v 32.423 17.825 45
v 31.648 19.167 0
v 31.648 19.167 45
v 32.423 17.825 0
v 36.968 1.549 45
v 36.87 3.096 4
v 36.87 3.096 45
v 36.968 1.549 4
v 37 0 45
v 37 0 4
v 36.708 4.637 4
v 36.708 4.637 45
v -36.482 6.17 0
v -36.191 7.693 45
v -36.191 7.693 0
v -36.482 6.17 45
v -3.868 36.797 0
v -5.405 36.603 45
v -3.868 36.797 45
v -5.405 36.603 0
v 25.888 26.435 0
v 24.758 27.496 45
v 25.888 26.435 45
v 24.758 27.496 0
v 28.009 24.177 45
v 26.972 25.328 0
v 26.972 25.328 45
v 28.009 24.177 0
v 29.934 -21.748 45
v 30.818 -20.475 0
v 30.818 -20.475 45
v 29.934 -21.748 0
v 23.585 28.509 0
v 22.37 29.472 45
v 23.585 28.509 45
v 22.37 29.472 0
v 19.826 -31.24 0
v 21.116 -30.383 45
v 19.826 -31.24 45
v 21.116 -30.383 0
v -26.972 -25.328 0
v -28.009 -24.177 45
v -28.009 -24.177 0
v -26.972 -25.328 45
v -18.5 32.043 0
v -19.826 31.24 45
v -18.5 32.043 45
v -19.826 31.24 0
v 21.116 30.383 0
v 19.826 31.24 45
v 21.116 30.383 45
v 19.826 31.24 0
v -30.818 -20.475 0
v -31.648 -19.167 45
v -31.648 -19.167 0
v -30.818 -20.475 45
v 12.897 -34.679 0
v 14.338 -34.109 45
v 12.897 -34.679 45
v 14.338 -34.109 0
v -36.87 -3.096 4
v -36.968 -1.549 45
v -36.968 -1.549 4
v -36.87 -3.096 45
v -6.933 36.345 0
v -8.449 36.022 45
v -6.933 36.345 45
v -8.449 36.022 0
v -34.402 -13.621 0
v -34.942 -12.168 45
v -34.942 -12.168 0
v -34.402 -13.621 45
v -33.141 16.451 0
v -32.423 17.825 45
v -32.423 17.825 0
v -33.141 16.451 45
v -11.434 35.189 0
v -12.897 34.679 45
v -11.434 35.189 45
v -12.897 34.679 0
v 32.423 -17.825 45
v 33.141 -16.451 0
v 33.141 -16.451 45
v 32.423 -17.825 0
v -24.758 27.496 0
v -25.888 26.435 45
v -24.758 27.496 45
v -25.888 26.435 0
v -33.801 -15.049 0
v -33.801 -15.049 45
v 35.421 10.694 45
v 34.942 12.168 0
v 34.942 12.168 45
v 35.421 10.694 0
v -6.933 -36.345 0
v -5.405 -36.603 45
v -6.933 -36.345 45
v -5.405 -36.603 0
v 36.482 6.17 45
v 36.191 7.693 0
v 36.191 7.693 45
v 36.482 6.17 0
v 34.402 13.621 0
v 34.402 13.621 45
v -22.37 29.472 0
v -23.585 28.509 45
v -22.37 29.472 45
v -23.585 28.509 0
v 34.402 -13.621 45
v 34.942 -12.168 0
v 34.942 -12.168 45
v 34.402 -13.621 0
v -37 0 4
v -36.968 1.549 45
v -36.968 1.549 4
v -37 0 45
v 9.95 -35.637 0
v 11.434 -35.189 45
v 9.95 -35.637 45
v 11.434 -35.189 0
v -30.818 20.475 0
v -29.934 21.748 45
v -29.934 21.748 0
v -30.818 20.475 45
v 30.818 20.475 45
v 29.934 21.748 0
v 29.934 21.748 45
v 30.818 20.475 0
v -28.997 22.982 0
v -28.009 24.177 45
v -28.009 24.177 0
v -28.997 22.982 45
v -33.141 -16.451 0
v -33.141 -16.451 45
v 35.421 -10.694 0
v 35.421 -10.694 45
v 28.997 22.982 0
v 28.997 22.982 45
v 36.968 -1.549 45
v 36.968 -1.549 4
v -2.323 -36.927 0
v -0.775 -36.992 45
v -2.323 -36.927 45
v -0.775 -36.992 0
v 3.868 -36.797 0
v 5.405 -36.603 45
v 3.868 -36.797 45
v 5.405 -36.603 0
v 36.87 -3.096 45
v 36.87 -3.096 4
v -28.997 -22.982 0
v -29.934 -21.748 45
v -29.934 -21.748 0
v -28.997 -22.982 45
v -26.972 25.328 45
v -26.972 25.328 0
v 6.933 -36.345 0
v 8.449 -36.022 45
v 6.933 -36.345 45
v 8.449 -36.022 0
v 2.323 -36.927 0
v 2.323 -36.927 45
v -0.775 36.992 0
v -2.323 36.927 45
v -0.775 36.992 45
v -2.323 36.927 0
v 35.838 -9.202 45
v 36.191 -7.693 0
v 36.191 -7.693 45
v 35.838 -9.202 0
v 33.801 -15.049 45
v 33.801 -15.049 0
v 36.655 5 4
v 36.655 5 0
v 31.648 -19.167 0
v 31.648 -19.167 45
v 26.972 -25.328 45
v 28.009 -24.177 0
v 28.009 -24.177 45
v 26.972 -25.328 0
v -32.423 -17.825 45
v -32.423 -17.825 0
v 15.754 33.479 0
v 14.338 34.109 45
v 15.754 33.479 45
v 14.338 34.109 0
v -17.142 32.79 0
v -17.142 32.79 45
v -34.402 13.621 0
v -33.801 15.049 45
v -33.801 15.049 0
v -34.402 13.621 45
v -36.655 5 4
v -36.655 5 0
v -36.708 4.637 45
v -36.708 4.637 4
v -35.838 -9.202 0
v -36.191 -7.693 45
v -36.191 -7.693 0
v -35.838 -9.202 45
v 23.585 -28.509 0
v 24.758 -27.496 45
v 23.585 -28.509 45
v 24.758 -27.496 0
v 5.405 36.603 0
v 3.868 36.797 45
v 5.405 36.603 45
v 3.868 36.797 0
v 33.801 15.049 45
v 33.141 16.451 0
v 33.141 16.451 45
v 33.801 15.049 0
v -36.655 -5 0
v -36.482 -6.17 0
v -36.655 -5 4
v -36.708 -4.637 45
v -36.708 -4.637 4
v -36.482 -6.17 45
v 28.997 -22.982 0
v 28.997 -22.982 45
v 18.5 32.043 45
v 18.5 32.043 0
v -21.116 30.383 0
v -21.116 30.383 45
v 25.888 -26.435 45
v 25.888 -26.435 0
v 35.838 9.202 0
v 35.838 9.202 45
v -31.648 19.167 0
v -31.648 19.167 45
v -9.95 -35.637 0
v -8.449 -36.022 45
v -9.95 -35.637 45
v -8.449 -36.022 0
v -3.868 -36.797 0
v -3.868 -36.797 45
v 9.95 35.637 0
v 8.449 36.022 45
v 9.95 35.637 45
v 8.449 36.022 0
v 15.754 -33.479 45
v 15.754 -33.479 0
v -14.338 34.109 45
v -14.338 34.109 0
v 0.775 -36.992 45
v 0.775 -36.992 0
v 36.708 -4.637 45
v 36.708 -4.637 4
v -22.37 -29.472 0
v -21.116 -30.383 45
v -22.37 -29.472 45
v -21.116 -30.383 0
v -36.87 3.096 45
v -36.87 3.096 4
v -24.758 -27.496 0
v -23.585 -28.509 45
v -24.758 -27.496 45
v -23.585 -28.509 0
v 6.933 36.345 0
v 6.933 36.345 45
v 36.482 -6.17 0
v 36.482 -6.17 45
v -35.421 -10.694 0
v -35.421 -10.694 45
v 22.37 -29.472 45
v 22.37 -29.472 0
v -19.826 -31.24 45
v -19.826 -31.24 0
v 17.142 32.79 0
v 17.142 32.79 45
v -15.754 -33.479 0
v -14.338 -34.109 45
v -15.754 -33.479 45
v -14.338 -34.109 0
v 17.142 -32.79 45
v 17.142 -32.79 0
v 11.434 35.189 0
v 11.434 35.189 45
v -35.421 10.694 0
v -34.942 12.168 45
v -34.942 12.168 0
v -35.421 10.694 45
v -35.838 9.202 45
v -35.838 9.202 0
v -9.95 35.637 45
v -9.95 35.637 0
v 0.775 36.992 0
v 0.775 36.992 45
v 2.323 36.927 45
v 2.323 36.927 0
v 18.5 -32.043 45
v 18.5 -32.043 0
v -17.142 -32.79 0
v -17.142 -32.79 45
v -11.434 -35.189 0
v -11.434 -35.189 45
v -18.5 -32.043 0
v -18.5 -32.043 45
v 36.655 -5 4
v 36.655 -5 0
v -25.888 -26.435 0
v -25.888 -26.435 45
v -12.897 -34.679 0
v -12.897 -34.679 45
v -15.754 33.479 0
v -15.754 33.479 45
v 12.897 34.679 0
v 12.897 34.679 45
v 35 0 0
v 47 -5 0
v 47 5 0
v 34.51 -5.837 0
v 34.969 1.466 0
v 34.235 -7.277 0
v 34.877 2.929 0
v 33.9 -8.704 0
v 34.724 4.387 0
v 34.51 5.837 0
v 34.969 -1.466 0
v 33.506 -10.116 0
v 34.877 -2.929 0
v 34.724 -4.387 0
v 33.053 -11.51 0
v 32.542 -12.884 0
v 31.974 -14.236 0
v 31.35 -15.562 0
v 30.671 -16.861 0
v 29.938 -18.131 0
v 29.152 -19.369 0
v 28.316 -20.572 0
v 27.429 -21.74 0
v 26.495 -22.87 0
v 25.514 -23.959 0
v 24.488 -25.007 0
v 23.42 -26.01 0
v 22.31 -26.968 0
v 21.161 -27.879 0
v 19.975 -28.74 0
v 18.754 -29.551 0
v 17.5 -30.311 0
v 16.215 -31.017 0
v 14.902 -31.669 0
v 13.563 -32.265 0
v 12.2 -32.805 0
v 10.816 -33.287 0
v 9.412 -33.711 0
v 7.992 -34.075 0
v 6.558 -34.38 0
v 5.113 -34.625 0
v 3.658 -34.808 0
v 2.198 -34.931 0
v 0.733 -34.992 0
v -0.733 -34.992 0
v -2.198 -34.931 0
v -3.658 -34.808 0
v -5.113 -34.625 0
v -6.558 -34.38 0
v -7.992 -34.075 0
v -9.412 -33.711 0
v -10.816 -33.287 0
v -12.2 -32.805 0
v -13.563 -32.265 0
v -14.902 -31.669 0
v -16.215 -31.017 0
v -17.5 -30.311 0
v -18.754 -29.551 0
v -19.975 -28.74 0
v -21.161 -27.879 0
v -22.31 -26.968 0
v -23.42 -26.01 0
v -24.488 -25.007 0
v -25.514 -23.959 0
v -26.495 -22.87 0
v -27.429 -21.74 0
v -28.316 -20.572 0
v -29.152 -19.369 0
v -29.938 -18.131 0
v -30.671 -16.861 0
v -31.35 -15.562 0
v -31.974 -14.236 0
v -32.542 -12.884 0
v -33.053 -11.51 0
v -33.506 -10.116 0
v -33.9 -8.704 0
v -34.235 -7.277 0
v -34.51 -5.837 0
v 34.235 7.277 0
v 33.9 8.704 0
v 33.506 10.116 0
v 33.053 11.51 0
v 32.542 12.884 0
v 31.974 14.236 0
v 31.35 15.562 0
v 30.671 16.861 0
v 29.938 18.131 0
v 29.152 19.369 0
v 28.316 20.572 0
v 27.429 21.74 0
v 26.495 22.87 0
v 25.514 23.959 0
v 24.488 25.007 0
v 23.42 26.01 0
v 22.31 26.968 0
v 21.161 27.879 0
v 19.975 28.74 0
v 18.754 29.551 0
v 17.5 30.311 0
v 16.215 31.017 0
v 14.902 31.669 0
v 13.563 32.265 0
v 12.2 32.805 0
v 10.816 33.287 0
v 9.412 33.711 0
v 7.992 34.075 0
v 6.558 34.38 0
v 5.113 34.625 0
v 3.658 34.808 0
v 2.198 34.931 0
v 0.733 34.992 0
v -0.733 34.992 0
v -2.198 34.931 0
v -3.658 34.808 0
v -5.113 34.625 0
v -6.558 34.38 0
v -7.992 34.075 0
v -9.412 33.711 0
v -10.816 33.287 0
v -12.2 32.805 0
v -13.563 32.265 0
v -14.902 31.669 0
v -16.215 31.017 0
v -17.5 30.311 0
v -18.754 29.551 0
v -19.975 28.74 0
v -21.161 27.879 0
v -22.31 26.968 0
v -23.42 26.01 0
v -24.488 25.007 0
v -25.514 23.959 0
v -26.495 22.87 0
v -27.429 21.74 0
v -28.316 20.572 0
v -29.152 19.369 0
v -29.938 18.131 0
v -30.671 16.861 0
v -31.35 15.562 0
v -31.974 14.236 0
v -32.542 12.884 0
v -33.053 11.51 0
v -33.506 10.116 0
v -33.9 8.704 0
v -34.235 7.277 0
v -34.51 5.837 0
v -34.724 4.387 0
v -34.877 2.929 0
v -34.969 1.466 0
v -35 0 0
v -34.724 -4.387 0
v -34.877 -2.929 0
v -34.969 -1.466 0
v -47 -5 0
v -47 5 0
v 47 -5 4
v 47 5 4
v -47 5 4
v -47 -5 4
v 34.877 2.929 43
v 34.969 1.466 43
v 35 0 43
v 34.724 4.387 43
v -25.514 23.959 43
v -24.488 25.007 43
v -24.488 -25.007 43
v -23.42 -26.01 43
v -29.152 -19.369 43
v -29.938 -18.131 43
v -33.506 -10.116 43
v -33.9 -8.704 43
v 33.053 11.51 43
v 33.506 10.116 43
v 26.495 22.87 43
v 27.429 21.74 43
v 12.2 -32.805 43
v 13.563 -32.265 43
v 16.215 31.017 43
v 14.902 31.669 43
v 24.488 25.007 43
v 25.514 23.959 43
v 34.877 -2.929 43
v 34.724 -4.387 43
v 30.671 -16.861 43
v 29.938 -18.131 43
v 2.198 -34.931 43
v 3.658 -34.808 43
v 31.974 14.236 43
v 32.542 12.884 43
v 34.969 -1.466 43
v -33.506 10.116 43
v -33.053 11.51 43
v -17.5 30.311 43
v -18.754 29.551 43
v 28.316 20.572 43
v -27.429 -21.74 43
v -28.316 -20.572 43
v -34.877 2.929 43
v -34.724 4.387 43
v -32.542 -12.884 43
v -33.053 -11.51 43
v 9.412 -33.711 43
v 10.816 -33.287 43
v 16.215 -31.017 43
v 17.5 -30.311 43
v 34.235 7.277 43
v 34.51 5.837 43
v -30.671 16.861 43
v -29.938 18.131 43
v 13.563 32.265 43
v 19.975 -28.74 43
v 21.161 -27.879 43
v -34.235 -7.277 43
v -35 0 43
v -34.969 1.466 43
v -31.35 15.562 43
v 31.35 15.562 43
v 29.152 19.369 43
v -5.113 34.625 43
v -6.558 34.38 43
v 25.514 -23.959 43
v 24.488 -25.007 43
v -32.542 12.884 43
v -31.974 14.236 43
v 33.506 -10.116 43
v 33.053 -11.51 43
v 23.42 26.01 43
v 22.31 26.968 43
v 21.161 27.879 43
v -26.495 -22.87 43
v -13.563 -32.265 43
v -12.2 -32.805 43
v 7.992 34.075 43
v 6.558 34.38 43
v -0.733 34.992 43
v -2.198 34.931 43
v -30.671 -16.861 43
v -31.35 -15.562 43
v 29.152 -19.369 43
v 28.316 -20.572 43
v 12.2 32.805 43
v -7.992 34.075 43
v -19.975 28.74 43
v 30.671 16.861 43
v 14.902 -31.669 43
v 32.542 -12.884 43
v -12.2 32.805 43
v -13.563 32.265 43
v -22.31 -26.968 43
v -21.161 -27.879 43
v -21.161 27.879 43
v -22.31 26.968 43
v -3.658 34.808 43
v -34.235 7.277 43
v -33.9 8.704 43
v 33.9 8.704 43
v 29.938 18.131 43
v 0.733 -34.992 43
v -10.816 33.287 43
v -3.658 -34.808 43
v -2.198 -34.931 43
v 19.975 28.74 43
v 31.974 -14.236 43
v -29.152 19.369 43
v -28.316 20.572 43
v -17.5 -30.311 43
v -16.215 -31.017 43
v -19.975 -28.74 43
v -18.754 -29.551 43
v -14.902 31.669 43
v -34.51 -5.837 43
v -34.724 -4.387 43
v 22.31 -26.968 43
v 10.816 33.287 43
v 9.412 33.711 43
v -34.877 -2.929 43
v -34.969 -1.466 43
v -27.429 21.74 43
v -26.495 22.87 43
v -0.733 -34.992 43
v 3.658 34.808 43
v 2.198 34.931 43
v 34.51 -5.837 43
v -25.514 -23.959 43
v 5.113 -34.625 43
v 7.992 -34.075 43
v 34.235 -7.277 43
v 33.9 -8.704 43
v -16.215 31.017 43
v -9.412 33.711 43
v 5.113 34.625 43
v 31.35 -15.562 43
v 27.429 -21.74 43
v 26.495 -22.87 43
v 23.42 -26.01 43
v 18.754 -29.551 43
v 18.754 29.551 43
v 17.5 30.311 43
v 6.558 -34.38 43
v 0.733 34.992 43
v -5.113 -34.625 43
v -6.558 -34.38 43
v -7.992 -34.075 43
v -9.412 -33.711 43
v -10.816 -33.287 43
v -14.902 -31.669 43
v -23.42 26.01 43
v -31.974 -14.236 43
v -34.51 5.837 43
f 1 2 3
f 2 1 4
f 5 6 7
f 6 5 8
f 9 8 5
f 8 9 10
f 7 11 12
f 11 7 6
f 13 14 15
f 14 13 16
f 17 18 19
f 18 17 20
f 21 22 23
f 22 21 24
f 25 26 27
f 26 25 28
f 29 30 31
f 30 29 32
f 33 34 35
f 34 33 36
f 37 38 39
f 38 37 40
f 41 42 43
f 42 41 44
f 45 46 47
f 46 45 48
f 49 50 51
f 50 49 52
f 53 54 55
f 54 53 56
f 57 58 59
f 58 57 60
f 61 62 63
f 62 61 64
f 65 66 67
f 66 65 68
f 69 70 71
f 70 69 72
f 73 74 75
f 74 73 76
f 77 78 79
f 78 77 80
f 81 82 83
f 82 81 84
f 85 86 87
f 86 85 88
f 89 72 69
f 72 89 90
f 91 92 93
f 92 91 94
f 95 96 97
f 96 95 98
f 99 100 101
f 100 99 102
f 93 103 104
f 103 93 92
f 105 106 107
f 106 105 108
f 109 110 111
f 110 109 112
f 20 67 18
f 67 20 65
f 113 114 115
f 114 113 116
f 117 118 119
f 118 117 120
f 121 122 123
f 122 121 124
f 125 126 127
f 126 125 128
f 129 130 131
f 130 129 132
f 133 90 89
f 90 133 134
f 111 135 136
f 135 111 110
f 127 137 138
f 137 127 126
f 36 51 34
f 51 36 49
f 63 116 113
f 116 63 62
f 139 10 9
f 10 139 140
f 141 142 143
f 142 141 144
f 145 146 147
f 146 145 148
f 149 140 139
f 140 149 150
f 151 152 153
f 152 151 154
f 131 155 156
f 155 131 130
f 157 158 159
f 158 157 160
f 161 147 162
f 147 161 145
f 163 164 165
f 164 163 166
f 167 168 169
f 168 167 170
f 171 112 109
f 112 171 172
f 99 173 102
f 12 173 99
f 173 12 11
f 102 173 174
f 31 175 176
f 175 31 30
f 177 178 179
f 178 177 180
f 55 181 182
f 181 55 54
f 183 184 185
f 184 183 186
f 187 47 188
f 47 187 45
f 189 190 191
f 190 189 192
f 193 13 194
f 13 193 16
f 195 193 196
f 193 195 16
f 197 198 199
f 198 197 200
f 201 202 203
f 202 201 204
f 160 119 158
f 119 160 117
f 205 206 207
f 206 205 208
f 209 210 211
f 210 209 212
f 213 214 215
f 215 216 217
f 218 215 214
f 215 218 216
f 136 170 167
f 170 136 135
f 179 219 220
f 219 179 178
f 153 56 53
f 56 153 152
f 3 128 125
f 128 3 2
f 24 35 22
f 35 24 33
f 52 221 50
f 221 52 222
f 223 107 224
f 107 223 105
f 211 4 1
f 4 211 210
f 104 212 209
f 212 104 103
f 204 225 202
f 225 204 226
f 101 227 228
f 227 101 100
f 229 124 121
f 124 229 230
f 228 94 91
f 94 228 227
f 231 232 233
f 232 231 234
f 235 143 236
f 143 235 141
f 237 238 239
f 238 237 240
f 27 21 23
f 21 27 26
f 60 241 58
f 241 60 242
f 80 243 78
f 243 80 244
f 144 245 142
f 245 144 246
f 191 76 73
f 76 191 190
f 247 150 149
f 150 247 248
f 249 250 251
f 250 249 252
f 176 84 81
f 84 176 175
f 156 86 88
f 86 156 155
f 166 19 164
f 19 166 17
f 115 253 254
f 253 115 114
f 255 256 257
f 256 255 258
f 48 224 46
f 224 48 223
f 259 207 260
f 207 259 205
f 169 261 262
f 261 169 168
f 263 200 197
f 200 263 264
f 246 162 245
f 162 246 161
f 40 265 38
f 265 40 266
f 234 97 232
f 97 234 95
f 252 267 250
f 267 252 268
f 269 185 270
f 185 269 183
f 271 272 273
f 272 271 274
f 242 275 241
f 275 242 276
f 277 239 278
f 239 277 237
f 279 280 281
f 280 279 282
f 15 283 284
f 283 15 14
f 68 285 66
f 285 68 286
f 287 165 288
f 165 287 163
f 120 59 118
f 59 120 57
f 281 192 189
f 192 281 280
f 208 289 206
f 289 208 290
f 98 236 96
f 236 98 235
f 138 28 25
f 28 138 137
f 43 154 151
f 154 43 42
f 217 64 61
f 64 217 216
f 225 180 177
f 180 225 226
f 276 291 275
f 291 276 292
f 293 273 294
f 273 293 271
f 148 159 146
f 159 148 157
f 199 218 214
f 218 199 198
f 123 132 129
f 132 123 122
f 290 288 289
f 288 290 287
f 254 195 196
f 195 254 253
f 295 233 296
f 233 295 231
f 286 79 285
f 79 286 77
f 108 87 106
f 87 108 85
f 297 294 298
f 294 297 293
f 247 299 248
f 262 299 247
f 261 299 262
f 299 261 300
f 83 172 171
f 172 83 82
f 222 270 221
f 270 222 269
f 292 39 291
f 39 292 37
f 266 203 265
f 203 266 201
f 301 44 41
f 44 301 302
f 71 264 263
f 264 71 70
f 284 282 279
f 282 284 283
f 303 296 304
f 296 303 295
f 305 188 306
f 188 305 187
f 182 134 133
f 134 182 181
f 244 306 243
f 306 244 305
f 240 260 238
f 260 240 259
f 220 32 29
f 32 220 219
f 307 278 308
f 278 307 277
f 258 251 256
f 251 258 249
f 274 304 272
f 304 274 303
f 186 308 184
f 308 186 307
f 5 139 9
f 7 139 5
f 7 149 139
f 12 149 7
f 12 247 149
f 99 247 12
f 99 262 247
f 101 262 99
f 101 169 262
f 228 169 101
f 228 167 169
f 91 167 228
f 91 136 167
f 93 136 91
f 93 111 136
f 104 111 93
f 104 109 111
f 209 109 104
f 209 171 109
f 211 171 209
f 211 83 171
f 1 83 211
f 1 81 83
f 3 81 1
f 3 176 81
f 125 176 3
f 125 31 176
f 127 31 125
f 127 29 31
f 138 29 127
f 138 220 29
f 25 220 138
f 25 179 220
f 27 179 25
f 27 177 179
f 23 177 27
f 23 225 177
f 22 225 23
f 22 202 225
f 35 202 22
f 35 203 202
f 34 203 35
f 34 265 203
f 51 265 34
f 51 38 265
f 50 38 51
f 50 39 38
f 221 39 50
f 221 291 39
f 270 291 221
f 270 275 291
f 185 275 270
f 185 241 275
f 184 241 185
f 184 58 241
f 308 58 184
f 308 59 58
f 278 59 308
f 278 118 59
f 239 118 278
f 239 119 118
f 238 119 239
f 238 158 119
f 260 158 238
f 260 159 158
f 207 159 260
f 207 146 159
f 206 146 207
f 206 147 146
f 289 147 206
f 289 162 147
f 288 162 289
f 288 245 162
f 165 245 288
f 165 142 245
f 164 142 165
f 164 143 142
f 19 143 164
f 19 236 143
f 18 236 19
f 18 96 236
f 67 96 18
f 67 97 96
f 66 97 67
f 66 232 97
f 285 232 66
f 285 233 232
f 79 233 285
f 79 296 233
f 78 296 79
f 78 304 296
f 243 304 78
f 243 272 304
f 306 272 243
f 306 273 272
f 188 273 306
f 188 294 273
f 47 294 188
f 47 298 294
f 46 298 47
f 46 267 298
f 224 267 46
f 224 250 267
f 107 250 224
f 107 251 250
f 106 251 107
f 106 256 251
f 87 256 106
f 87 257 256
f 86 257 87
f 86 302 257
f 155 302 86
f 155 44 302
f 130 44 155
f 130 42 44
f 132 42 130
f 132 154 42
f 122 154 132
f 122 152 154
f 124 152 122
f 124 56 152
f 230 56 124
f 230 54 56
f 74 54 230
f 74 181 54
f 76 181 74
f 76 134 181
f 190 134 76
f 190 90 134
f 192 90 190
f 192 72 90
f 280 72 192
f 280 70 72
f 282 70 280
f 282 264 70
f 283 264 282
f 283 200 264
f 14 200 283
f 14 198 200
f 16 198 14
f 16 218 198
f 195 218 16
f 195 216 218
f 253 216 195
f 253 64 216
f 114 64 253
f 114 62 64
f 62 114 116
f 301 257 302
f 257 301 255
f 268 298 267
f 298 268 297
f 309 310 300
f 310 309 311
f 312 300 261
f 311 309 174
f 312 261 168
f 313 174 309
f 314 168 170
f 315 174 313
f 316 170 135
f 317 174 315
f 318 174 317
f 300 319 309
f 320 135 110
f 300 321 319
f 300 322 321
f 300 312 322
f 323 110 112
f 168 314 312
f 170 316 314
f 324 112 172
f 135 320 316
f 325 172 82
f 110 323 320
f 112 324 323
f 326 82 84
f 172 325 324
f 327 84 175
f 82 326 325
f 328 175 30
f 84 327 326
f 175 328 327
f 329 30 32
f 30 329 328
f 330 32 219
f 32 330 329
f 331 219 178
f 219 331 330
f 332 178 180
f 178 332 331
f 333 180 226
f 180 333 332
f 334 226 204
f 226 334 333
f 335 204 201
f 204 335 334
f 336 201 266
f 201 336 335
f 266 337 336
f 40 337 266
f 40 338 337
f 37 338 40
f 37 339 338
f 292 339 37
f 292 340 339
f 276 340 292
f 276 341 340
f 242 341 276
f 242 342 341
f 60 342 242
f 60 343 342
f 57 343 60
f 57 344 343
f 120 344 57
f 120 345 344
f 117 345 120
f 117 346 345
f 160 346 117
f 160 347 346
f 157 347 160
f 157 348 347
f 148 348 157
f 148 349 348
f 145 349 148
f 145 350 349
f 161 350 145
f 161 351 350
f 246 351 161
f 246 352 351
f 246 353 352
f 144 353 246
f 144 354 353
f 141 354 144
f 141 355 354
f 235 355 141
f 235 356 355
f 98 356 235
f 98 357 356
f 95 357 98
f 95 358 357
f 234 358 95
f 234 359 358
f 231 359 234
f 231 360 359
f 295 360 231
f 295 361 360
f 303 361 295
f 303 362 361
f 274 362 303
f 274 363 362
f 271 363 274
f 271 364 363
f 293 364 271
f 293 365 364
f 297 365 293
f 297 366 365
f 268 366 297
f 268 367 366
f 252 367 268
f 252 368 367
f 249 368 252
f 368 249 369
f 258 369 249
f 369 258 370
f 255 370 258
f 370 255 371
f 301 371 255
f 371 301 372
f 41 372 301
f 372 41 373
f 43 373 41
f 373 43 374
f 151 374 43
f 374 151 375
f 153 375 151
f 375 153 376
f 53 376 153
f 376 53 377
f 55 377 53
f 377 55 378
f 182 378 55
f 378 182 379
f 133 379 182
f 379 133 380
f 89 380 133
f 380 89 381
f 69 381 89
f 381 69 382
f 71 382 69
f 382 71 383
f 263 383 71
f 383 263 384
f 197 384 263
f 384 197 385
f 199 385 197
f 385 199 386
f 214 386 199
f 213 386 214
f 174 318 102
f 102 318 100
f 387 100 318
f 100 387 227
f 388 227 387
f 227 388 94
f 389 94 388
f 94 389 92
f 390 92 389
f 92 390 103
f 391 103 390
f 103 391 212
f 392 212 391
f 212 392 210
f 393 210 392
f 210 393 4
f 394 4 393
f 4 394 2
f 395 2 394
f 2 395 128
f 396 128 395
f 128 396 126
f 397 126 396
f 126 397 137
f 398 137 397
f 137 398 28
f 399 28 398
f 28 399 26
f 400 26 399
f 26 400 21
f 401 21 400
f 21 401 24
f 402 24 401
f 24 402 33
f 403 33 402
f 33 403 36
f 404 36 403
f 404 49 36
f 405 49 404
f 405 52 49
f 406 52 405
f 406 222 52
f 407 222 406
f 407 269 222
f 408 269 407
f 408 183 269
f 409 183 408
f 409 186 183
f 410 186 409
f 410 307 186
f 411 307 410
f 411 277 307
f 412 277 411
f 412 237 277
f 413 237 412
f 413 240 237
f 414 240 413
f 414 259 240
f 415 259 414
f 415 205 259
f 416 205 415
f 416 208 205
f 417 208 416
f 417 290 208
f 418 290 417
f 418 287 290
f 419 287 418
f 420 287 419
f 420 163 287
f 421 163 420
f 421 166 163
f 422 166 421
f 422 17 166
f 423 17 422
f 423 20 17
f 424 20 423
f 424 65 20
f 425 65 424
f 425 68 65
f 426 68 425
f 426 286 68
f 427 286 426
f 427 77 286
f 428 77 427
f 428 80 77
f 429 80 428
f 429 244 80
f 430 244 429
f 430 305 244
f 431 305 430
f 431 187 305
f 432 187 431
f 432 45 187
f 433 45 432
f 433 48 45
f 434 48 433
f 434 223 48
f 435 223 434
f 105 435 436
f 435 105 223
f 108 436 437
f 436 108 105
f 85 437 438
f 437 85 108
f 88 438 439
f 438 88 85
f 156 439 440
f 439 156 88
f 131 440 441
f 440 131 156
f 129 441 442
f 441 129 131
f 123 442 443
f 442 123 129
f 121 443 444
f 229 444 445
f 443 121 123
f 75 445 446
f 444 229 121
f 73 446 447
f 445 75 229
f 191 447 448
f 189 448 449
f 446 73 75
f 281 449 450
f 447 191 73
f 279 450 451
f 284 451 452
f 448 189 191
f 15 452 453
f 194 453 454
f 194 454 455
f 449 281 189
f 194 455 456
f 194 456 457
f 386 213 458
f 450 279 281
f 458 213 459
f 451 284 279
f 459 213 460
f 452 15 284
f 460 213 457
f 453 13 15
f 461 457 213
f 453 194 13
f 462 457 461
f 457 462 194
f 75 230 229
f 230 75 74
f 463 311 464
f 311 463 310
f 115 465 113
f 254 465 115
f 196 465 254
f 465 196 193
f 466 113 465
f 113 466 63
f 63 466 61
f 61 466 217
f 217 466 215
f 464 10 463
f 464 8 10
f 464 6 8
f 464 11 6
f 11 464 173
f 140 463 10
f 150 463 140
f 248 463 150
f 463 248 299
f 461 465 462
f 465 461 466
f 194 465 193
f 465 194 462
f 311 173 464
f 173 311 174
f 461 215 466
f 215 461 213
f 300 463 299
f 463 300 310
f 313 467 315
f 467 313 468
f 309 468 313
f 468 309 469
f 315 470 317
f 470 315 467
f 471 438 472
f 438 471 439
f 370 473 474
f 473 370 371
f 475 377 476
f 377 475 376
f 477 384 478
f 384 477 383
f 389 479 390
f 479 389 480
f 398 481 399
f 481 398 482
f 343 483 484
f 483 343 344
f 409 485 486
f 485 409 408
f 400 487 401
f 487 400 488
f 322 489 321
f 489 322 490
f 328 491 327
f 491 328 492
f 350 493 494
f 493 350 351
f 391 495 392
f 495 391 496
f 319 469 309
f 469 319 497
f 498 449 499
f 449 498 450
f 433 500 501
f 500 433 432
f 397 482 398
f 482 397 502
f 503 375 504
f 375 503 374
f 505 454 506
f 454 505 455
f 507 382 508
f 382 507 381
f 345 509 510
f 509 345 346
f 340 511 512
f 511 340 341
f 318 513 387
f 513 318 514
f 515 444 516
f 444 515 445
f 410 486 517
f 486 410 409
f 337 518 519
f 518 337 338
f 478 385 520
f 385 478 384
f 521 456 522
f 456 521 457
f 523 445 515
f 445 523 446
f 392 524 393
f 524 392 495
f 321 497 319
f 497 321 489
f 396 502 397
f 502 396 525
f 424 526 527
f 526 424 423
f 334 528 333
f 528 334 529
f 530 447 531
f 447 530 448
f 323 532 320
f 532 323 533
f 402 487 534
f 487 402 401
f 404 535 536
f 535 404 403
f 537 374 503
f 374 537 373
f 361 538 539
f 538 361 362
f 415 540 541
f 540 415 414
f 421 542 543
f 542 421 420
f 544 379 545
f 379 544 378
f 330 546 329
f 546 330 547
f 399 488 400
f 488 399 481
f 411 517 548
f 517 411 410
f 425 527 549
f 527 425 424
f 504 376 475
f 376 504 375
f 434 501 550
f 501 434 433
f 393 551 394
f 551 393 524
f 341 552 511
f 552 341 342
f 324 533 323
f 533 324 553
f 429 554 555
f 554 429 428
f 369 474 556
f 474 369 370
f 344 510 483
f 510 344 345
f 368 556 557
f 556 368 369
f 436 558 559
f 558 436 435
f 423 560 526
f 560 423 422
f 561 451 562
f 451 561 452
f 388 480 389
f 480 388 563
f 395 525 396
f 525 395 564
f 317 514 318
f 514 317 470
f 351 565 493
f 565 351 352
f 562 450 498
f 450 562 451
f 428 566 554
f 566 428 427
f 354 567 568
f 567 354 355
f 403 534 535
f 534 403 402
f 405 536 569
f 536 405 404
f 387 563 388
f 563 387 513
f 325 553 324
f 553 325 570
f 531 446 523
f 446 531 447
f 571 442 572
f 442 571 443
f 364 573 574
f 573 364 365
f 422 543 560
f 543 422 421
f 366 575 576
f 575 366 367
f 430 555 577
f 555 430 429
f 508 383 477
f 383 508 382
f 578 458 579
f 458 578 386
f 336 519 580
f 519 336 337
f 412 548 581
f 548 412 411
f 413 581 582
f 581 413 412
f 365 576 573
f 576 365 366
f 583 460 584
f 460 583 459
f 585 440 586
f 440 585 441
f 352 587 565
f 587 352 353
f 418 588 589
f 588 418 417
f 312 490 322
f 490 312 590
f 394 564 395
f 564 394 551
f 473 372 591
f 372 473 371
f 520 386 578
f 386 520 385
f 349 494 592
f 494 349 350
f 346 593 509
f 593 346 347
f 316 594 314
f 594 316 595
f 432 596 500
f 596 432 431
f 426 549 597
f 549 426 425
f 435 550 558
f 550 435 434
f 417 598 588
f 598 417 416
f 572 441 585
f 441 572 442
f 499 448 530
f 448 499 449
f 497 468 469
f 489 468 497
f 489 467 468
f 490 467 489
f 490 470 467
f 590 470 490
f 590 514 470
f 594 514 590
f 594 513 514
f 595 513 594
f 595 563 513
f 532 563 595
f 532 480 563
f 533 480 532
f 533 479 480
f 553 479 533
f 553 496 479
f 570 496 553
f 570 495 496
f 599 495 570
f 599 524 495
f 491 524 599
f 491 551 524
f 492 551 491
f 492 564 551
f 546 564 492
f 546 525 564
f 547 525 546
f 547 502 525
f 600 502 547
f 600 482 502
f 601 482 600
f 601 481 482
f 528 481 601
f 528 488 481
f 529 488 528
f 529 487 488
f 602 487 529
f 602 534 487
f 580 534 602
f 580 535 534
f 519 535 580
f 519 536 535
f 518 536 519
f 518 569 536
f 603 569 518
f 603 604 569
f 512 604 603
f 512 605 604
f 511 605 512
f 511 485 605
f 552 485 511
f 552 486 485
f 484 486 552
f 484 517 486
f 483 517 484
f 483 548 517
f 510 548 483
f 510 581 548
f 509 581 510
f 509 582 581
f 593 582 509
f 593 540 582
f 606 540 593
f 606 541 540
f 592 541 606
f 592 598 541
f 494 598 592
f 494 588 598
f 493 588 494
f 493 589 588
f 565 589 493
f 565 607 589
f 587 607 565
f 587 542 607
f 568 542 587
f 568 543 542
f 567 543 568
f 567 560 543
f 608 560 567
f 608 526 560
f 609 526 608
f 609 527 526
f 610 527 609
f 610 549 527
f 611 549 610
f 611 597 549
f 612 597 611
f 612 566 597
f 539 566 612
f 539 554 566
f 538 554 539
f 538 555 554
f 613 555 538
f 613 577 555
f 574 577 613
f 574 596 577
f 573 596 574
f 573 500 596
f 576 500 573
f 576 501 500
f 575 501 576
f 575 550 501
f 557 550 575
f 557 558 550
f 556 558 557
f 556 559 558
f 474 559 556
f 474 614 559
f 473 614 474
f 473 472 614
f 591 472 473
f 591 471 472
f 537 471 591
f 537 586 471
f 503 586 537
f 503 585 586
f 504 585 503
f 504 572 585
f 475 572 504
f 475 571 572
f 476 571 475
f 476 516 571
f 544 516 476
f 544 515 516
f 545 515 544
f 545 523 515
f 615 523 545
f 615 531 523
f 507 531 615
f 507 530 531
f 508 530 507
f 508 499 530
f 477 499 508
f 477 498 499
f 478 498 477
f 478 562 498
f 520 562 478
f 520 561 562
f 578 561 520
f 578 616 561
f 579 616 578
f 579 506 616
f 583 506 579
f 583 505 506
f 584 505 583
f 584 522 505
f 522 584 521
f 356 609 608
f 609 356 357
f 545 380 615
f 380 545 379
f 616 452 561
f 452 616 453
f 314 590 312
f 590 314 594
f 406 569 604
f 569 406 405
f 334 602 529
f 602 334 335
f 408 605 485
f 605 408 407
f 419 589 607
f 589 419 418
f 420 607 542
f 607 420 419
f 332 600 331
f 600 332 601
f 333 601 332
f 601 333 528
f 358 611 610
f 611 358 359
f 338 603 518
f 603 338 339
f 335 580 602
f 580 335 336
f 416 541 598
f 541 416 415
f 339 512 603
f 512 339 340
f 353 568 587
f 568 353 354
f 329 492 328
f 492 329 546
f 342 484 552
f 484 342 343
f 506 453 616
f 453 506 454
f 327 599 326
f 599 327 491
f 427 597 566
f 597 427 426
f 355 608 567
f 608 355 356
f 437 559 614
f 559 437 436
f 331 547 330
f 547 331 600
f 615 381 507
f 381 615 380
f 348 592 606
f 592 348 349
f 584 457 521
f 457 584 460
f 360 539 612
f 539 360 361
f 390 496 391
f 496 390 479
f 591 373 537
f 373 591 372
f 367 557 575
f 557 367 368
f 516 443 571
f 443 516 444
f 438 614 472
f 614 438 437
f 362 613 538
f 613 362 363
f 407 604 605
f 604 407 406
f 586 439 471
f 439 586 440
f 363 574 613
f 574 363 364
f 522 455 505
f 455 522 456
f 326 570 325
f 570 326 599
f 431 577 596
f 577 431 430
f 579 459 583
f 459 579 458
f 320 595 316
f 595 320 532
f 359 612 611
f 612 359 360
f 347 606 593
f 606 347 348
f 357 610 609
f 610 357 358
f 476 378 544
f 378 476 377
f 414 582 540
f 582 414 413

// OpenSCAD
$fn = 150;

RADIUS = 35;
HEIGHT = 43;
WALL_STRENGTH = 2;

EAR_WIDTH = 10;
EAR_HEIGHT = 4;

render() {
  difference() {
    union() {
      cylinder(h = HEIGHT + WALL_STRENGTH, r = RADIUS + WALL_STRENGTH);
      translate(v = [ 0, 0, EAR_HEIGHT / 2 ]) {
        cube(size = [ (RADIUS + WALL_STRENGTH + EAR_WIDTH) * 2, EAR_WIDTH, EAR_HEIGHT ], center = true);
      }
    }
    cylinder(h = HEIGHT, r = RADIUS);
  }
}
